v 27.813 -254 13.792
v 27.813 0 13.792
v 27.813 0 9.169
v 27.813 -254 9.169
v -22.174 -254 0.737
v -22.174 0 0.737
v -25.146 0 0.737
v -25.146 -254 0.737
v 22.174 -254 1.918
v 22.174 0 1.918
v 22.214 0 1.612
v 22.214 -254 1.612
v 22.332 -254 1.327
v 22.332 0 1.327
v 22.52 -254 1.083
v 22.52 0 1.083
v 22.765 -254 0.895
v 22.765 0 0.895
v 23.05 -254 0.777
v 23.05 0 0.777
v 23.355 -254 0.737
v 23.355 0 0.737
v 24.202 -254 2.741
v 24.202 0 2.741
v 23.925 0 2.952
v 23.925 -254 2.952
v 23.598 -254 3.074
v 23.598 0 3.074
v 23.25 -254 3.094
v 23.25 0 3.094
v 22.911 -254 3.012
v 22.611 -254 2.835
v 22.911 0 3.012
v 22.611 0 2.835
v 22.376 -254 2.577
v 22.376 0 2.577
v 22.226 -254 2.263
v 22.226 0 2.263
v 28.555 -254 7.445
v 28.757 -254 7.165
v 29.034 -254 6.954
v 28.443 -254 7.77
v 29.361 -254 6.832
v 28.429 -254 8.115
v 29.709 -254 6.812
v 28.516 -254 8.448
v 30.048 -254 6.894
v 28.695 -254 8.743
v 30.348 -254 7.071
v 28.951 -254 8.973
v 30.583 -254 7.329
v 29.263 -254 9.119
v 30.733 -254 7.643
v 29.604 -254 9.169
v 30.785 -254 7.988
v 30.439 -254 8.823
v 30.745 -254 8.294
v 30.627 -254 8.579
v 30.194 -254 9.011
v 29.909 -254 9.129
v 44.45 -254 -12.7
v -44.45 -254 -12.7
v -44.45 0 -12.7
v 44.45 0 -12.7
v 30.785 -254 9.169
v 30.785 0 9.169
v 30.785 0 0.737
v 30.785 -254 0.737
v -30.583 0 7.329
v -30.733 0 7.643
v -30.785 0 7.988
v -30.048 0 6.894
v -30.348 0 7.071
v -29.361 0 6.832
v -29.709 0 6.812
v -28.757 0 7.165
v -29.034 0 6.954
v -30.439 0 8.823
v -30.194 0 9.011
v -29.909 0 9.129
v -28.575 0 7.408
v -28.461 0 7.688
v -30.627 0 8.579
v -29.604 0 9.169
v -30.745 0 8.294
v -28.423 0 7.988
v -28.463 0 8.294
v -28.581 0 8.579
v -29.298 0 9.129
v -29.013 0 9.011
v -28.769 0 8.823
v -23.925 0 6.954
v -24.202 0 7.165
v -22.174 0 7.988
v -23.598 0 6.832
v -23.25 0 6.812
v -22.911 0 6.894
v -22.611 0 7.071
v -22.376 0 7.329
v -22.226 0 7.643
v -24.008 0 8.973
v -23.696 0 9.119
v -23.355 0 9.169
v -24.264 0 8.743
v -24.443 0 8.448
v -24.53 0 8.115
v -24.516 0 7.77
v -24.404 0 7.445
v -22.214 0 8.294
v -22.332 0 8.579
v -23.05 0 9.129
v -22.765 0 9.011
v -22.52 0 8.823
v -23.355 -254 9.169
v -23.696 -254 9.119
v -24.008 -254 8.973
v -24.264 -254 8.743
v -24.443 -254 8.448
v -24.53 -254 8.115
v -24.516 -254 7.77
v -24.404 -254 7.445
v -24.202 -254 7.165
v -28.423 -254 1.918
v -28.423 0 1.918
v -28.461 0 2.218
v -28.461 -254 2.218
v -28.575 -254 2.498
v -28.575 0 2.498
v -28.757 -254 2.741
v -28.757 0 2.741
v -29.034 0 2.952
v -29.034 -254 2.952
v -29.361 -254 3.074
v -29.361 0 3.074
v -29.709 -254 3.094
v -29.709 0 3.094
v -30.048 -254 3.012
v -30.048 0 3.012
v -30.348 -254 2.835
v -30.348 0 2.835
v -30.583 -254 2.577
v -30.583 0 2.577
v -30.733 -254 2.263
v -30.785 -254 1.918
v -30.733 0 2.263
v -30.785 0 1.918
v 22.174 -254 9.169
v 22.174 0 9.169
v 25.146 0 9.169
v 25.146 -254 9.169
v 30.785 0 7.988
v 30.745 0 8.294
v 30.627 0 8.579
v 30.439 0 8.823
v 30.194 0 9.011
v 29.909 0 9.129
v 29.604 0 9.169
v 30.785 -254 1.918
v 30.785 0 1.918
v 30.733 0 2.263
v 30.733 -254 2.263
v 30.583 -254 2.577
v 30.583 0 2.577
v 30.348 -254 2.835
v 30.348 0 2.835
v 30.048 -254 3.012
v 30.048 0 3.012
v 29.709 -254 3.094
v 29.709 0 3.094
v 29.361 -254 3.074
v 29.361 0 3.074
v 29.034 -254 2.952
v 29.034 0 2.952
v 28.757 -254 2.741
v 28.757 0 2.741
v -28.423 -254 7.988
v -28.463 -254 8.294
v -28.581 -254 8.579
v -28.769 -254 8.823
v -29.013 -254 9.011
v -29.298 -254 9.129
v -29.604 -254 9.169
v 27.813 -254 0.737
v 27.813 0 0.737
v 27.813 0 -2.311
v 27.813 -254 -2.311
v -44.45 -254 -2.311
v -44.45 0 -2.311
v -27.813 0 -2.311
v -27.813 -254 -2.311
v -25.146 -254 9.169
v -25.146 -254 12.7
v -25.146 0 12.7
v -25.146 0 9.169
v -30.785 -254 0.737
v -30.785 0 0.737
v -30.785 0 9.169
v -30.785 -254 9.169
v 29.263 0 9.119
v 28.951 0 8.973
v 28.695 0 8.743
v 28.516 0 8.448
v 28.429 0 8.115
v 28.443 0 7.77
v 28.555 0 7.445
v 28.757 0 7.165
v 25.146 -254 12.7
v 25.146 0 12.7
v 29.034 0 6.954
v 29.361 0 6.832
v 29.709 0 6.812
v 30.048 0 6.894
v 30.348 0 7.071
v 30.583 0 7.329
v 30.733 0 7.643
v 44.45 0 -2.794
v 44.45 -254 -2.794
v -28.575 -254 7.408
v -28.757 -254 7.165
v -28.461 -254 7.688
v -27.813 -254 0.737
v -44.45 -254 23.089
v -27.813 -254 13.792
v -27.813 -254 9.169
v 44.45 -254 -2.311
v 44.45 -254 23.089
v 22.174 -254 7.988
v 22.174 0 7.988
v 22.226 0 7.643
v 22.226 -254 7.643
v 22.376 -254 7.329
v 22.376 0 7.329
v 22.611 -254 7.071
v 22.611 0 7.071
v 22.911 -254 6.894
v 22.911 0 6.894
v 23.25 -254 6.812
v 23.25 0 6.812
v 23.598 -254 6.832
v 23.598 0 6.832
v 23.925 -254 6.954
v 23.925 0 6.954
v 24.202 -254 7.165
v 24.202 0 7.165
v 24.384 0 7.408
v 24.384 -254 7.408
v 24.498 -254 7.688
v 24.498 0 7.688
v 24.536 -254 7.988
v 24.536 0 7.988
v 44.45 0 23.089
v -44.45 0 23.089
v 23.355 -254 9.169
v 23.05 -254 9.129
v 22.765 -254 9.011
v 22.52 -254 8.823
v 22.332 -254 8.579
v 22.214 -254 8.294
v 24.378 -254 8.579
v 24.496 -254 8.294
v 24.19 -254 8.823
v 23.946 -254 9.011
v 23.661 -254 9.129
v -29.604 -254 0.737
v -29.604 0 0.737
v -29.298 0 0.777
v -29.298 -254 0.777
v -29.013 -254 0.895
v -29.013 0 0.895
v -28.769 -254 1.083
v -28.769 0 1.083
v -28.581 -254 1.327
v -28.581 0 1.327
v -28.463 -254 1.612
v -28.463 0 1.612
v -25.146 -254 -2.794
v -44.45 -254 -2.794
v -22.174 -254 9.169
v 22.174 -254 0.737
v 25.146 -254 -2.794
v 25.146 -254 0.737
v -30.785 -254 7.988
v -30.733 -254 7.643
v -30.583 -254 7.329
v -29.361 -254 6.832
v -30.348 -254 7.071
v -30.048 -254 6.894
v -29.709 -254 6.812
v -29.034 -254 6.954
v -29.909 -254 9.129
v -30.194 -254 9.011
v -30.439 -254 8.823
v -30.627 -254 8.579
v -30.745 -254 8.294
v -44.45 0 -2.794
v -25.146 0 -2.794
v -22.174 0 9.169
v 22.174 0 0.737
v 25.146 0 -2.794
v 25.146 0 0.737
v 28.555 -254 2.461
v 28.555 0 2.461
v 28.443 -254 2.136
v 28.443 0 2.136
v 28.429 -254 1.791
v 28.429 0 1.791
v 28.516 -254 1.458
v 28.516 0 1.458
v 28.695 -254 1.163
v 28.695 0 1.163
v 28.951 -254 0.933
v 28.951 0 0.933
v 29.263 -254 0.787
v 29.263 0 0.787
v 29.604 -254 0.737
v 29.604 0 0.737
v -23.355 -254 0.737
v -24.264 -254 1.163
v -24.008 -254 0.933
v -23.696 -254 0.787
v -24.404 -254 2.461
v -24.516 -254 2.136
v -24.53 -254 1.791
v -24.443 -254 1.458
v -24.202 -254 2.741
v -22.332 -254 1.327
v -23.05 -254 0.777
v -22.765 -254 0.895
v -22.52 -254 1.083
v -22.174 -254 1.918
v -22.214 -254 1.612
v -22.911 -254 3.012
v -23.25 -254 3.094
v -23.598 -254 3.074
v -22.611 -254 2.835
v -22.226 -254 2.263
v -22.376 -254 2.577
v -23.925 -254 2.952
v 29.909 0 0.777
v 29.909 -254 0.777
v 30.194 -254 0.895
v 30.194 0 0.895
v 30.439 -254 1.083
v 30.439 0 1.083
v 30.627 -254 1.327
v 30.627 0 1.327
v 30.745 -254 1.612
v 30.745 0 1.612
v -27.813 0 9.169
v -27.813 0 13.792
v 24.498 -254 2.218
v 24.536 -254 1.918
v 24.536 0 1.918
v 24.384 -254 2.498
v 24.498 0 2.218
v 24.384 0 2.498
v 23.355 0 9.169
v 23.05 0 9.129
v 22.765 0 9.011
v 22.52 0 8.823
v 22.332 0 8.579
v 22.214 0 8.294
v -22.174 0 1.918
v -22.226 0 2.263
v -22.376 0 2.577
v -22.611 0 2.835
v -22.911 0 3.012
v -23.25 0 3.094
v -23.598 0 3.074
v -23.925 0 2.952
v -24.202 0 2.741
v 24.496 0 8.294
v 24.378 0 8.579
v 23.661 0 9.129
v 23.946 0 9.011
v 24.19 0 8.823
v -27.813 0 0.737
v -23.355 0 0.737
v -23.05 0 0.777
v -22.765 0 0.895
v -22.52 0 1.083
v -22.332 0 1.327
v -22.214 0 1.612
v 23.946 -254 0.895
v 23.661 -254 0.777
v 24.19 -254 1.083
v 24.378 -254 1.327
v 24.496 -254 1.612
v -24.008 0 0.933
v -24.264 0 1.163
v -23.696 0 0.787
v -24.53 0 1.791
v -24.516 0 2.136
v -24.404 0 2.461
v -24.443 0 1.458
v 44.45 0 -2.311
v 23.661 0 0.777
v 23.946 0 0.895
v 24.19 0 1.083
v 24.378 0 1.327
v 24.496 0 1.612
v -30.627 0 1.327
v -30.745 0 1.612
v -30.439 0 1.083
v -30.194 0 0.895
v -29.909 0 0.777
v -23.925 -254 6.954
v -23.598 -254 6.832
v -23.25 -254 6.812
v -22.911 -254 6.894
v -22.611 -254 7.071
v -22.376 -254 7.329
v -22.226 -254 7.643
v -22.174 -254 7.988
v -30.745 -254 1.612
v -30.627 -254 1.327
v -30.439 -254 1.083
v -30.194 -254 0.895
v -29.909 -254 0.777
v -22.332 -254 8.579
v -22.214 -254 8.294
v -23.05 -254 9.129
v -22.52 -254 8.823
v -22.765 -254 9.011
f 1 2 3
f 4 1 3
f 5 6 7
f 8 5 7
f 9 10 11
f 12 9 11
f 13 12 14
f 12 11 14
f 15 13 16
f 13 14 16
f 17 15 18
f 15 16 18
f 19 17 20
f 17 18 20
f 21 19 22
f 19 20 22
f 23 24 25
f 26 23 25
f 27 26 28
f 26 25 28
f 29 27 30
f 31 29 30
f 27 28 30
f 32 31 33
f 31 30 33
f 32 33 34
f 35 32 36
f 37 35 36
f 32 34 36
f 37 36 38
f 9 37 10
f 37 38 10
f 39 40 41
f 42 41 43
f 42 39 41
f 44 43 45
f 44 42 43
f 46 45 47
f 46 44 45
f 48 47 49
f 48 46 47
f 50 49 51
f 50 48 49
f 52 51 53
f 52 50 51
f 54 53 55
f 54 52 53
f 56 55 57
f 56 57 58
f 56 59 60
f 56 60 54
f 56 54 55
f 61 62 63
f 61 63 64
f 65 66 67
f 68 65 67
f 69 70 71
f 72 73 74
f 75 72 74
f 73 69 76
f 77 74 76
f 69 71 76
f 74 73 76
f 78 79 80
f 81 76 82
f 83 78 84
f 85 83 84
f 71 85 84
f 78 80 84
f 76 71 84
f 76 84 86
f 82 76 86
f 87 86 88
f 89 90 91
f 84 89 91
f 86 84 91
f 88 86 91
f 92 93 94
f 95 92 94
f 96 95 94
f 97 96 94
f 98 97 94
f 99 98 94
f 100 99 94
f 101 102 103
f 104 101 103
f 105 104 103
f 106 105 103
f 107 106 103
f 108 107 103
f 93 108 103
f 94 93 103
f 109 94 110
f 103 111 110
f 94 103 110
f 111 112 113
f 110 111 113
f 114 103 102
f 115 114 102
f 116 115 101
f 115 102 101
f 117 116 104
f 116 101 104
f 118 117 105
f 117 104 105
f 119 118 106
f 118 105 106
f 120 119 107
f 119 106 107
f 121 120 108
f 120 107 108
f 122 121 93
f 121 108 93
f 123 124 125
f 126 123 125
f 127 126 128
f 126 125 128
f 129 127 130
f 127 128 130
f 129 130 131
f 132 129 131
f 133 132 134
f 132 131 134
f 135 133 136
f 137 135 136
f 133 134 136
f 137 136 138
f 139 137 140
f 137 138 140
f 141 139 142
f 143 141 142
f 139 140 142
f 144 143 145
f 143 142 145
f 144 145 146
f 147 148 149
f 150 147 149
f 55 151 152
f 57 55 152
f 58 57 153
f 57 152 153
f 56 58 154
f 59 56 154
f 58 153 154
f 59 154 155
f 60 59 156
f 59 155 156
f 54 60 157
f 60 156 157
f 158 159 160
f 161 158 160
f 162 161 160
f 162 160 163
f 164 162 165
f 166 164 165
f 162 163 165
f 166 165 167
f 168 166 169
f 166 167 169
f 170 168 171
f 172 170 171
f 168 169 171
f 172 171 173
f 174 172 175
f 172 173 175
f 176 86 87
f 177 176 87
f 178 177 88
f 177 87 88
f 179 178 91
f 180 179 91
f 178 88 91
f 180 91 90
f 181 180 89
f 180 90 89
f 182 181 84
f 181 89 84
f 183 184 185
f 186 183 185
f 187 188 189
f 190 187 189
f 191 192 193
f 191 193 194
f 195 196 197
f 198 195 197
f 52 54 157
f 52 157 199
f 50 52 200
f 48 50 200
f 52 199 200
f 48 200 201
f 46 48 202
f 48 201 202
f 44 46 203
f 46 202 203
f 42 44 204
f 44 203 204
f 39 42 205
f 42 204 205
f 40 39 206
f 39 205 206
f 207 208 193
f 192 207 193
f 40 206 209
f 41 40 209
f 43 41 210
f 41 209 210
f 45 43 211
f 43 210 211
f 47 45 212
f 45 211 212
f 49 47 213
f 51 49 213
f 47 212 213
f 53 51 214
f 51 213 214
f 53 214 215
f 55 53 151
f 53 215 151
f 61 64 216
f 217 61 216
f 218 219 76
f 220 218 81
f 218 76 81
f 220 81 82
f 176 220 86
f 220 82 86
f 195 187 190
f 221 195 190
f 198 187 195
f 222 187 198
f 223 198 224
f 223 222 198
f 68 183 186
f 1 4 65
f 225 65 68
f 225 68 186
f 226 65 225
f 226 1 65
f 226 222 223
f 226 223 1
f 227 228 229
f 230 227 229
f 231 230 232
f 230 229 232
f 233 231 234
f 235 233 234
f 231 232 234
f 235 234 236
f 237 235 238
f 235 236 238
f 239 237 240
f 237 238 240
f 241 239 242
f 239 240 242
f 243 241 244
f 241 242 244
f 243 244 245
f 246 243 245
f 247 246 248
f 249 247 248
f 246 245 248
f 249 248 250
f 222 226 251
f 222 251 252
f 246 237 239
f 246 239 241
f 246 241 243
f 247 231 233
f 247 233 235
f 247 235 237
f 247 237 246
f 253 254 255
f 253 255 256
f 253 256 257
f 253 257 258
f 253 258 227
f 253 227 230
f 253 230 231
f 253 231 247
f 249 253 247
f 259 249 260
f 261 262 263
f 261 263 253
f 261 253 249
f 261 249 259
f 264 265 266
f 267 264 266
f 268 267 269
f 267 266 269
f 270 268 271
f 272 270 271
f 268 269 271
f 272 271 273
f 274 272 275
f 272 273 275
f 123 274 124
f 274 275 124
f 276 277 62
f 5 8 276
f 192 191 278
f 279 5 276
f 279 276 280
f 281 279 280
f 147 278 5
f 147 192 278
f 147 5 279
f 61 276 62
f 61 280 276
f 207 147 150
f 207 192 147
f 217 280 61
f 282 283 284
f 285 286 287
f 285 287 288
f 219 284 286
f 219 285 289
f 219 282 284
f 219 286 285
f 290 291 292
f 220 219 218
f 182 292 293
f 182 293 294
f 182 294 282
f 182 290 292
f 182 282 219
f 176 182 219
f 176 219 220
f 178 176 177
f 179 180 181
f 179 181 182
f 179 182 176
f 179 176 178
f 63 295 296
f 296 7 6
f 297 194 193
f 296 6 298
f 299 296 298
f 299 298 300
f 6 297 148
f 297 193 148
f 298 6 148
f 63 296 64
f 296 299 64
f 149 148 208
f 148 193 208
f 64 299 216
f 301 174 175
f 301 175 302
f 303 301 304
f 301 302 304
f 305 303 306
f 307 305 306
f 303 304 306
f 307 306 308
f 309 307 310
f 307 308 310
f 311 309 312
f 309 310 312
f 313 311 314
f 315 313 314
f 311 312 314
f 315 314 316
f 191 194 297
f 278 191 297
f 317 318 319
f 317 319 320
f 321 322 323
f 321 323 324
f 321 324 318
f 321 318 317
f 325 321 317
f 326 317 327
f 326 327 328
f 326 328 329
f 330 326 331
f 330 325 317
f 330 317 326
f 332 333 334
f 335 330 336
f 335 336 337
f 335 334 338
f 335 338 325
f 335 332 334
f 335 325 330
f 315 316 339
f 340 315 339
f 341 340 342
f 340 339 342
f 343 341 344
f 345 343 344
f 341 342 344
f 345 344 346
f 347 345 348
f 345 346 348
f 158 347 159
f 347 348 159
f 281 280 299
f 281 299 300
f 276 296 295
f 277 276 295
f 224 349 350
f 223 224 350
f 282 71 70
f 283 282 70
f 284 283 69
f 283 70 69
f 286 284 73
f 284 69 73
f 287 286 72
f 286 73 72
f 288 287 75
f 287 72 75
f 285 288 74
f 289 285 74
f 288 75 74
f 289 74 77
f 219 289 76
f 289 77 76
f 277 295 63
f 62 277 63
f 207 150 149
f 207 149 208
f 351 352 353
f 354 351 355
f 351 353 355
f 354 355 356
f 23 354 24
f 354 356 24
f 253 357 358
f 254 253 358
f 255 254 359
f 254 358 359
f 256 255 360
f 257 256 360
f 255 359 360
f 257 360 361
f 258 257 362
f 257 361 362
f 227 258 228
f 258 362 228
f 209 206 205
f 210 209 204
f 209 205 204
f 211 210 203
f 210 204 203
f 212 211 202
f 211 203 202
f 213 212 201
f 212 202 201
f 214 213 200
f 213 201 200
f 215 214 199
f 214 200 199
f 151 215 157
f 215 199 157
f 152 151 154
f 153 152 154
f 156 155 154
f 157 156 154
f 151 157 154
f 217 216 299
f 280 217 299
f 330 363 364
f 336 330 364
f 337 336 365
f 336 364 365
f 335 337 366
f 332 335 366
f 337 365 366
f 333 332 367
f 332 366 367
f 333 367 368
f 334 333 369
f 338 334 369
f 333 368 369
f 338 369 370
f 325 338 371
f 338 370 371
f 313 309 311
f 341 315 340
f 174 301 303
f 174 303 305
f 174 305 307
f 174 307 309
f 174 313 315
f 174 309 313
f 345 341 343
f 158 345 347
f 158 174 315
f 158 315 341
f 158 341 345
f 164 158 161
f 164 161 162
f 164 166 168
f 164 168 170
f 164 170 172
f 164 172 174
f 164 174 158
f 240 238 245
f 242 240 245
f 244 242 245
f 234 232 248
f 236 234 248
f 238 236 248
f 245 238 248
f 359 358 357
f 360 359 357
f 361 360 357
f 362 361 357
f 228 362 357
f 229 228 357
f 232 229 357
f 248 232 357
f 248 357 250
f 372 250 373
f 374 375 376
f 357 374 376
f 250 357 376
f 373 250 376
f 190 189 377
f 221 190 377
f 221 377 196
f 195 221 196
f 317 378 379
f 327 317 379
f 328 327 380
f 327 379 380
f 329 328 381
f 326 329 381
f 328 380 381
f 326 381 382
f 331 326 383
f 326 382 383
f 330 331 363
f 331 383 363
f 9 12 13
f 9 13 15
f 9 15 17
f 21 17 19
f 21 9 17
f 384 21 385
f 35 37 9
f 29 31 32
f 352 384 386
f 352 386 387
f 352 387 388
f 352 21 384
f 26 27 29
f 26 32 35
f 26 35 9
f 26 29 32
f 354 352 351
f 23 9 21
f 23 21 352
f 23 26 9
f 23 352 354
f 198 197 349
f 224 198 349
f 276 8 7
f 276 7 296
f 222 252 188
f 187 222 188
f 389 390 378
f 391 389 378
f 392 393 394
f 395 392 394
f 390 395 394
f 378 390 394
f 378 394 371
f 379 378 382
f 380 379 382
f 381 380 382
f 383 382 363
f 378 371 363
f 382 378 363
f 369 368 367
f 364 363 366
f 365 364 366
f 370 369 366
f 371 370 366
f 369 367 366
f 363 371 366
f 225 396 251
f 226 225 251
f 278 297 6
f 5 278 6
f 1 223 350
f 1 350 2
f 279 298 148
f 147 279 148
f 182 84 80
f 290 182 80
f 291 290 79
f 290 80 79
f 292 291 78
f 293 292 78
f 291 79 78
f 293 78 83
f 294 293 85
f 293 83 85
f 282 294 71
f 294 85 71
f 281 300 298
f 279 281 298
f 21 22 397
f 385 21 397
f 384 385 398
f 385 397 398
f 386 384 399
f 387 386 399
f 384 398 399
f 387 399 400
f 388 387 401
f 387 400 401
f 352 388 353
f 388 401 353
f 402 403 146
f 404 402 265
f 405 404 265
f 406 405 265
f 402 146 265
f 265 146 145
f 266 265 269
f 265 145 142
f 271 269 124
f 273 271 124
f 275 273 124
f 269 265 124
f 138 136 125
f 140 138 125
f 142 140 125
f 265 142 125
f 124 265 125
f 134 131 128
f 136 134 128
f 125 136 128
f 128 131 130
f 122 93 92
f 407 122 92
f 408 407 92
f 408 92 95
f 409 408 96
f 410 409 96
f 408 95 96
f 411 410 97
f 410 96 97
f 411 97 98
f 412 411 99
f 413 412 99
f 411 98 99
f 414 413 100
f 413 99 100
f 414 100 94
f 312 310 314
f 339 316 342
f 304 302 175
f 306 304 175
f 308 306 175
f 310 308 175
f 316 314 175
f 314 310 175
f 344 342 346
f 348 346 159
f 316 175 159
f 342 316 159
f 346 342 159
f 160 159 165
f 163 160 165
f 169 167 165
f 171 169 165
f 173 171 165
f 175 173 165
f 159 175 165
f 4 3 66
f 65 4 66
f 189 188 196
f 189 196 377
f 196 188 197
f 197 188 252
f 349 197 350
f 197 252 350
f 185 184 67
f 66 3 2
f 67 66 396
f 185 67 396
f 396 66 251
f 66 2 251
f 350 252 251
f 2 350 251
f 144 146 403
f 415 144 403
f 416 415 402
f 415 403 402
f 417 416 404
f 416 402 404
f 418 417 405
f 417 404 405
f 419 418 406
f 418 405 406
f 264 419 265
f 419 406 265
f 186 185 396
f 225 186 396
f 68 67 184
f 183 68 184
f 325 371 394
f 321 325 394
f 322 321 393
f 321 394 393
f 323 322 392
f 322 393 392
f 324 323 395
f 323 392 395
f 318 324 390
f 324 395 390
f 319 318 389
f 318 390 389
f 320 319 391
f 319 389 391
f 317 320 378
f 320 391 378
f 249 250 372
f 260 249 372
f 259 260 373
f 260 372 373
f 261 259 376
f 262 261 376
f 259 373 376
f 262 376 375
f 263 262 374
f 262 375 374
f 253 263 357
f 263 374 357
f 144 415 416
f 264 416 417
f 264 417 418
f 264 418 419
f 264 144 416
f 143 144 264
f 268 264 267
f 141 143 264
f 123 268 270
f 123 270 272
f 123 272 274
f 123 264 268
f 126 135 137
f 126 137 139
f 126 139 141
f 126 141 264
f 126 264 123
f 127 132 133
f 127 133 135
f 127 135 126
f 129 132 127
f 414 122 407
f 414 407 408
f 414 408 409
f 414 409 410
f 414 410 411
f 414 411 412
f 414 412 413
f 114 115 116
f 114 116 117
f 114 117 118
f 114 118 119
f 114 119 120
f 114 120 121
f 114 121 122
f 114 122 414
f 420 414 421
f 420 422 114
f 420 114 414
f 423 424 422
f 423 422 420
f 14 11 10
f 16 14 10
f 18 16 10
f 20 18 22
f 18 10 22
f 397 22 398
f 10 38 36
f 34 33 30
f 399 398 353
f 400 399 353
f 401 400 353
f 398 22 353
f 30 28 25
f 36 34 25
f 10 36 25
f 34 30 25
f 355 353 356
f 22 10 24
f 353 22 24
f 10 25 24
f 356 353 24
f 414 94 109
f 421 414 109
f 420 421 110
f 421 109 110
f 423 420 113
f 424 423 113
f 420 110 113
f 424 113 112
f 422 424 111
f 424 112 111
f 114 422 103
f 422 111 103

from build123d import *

# Parameters (mm, degrees)
F1_DEPTH = 254
F2_DEPTH = 254
F3_DEPTH = 254
F4_DEPTH = 254


with BuildPart() as f1:
    # F0 (on Front) → F1 (new body)
    with BuildSketch(Plane.XZ):
        Polygon((-44.45, -12.7), (44.45, -12.7), (44.45, -2.794), (25.146, -2.794), (25.146, 0.7366), (23.3553, 0.7366), (22.1742, 0.7366), (22.1742, 1.9177), (22.1742, 7.9883), (22.1742, 9.1694), (23.3553, 9.1694), (25.146, 9.1694), (25.146, 12.7), (-25.146, 12.7), (-25.146, 9.1694), (-23.3553, 9.1694), (-22.1742, 9.1694), (-22.1742, 7.9883), (-22.1742, 1.9177), (-22.1742, 0.7366), (-23.3553, 0.7366), (-25.146, 0.7366), (-25.146, -2.794), (-44.45, -2.794), align=None)
    extrude(amount=F1_DEPTH)


with BuildPart() as f2:
    # F0 (on Front) → F2 (new body)
    with BuildSketch(Plane.XZ):
        Polygon((-30.7848, 0.7366), (-30.7848, 1.9177), (-30.7848, 7.9883), (-30.7848, 9.1694), (-29.6037, 9.1694), (-27.813, 9.1694), (-27.813, 13.7922), (27.813, 13.7922), (27.813, 9.1694), (29.6037, 9.1694), (30.7848, 9.1694), (30.7848, 7.9883), (30.7848, 1.9177), (30.7848, 0.7366), (29.6037, 0.7366), (27.813, 0.7366), (27.813, -2.3114), (44.45, -2.3114), (44.45, 23.0886), (-44.45, 23.0886), (-44.45, -2.3114), (-27.813, -2.3114), (-27.813, 0.7366), (-29.6037, 0.7366), align=None)
    extrude(amount=F2_DEPTH)


with BuildPart() as f3:
    # F0 (on Front) → F3 (new body)
    with BuildSketch(Plane.XZ):
        with BuildLine():
            ThreePointArc((-30.7848, 7.9883), (-30.047802, 6.893873), (-28.756571, 7.165276))
            ThreePointArc((-28.756571, 7.165276), (-28.509273, 7.544198), (-28.4226, 7.9883))
            ThreePointArc((-28.4226, 7.9883), (-28.768536, 8.823464), (-29.6037, 9.1694))
            ThreePointArc((-29.6037, 9.1694), (-30.438864, 8.823464), (-30.7848, 7.9883))
        make_face()
        with BuildLine():
            ThreePointArc((-28.4226, 1.9177), (-28.509273, 2.361802), (-28.75657, 2.740724))
            ThreePointArc((-28.75657, 2.740724), (-30.047802, 3.012127), (-30.7848, 1.9177))
            ThreePointArc((-30.7848, 1.9177), (-30.438864, 1.082536), (-29.6037, 0.7366))
            ThreePointArc((-29.6037, 0.7366), (-28.768536, 1.082536), (-28.4226, 1.9177))
        make_face()
        with BuildLine():
            ThreePointArc((-24.202429, 7.165276), (-22.911198, 6.893873), (-22.1742, 7.9883))
            ThreePointArc((-22.1742, 7.9883), (-22.520136, 8.823464), (-23.3553, 9.1694))
            ThreePointArc((-23.3553, 9.1694), (-24.443204, 8.44815), (-24.202429, 7.165276))
        make_face()
        with BuildLine():
            ThreePointArc((-24.202429, 2.740724), (-24.443204, 1.45785), (-23.3553, 0.7366))
            ThreePointArc((-23.3553, 0.7366), (-22.520136, 1.082536), (-22.1742, 1.9177))
            ThreePointArc((-22.1742, 1.9177), (-22.911198, 3.012127), (-24.202429, 2.740724))
        make_face()
    extrude(amount=F3_DEPTH)


with BuildPart() as f4:
    # F0 (on Front) → F4 (new body)
    with BuildSketch(Plane.XZ):
        with BuildLine():
            ThreePointArc((23.3553, 9.1694), (22.520136, 8.823464), (22.1742, 7.9883))
            ThreePointArc((22.1742, 7.9883), (22.911198, 6.893873), (24.20243, 7.165276))
            ThreePointArc((24.20243, 7.165276), (24.449727, 7.544198), (24.5364, 7.9883))
            ThreePointArc((24.5364, 7.9883), (24.190464, 8.823464), (23.3553, 9.1694))
        make_face()
        with BuildLine():
            ThreePointArc((29.6037, 9.1694), (28.515796, 8.44815), (28.75657, 7.165276))
            ThreePointArc((28.75657, 7.165276), (30.047802, 6.893873), (30.7848, 7.9883))
            ThreePointArc((30.7848, 7.9883), (30.438864, 8.823464), (29.6037, 9.1694))
        make_face()
        with BuildLine():
            ThreePointArc((30.7848, 1.9177), (30.047802, 3.012127), (28.756571, 2.740724))
            ThreePointArc((28.756571, 2.740724), (28.515796, 1.45785), (29.6037, 0.7366))
            ThreePointArc((29.6037, 0.7366), (30.438864, 1.082536), (30.7848, 1.9177))
        make_face()
        with BuildLine():
            ThreePointArc((22.1742, 1.9177), (22.520136, 1.082536), (23.3553, 0.7366))
            ThreePointArc((23.3553, 0.7366), (24.190464, 1.082536), (24.5364, 1.9177))
            ThreePointArc((24.5364, 1.9177), (24.449727, 2.361802), (24.202429, 2.740724))
            ThreePointArc((24.202429, 2.740724), (22.911198, 3.012127), (22.1742, 1.9177))
        make_face()
    extrude(amount=F4_DEPTH)


solid = Compound([f1.part, f2.part, f3.part, f4.part])
